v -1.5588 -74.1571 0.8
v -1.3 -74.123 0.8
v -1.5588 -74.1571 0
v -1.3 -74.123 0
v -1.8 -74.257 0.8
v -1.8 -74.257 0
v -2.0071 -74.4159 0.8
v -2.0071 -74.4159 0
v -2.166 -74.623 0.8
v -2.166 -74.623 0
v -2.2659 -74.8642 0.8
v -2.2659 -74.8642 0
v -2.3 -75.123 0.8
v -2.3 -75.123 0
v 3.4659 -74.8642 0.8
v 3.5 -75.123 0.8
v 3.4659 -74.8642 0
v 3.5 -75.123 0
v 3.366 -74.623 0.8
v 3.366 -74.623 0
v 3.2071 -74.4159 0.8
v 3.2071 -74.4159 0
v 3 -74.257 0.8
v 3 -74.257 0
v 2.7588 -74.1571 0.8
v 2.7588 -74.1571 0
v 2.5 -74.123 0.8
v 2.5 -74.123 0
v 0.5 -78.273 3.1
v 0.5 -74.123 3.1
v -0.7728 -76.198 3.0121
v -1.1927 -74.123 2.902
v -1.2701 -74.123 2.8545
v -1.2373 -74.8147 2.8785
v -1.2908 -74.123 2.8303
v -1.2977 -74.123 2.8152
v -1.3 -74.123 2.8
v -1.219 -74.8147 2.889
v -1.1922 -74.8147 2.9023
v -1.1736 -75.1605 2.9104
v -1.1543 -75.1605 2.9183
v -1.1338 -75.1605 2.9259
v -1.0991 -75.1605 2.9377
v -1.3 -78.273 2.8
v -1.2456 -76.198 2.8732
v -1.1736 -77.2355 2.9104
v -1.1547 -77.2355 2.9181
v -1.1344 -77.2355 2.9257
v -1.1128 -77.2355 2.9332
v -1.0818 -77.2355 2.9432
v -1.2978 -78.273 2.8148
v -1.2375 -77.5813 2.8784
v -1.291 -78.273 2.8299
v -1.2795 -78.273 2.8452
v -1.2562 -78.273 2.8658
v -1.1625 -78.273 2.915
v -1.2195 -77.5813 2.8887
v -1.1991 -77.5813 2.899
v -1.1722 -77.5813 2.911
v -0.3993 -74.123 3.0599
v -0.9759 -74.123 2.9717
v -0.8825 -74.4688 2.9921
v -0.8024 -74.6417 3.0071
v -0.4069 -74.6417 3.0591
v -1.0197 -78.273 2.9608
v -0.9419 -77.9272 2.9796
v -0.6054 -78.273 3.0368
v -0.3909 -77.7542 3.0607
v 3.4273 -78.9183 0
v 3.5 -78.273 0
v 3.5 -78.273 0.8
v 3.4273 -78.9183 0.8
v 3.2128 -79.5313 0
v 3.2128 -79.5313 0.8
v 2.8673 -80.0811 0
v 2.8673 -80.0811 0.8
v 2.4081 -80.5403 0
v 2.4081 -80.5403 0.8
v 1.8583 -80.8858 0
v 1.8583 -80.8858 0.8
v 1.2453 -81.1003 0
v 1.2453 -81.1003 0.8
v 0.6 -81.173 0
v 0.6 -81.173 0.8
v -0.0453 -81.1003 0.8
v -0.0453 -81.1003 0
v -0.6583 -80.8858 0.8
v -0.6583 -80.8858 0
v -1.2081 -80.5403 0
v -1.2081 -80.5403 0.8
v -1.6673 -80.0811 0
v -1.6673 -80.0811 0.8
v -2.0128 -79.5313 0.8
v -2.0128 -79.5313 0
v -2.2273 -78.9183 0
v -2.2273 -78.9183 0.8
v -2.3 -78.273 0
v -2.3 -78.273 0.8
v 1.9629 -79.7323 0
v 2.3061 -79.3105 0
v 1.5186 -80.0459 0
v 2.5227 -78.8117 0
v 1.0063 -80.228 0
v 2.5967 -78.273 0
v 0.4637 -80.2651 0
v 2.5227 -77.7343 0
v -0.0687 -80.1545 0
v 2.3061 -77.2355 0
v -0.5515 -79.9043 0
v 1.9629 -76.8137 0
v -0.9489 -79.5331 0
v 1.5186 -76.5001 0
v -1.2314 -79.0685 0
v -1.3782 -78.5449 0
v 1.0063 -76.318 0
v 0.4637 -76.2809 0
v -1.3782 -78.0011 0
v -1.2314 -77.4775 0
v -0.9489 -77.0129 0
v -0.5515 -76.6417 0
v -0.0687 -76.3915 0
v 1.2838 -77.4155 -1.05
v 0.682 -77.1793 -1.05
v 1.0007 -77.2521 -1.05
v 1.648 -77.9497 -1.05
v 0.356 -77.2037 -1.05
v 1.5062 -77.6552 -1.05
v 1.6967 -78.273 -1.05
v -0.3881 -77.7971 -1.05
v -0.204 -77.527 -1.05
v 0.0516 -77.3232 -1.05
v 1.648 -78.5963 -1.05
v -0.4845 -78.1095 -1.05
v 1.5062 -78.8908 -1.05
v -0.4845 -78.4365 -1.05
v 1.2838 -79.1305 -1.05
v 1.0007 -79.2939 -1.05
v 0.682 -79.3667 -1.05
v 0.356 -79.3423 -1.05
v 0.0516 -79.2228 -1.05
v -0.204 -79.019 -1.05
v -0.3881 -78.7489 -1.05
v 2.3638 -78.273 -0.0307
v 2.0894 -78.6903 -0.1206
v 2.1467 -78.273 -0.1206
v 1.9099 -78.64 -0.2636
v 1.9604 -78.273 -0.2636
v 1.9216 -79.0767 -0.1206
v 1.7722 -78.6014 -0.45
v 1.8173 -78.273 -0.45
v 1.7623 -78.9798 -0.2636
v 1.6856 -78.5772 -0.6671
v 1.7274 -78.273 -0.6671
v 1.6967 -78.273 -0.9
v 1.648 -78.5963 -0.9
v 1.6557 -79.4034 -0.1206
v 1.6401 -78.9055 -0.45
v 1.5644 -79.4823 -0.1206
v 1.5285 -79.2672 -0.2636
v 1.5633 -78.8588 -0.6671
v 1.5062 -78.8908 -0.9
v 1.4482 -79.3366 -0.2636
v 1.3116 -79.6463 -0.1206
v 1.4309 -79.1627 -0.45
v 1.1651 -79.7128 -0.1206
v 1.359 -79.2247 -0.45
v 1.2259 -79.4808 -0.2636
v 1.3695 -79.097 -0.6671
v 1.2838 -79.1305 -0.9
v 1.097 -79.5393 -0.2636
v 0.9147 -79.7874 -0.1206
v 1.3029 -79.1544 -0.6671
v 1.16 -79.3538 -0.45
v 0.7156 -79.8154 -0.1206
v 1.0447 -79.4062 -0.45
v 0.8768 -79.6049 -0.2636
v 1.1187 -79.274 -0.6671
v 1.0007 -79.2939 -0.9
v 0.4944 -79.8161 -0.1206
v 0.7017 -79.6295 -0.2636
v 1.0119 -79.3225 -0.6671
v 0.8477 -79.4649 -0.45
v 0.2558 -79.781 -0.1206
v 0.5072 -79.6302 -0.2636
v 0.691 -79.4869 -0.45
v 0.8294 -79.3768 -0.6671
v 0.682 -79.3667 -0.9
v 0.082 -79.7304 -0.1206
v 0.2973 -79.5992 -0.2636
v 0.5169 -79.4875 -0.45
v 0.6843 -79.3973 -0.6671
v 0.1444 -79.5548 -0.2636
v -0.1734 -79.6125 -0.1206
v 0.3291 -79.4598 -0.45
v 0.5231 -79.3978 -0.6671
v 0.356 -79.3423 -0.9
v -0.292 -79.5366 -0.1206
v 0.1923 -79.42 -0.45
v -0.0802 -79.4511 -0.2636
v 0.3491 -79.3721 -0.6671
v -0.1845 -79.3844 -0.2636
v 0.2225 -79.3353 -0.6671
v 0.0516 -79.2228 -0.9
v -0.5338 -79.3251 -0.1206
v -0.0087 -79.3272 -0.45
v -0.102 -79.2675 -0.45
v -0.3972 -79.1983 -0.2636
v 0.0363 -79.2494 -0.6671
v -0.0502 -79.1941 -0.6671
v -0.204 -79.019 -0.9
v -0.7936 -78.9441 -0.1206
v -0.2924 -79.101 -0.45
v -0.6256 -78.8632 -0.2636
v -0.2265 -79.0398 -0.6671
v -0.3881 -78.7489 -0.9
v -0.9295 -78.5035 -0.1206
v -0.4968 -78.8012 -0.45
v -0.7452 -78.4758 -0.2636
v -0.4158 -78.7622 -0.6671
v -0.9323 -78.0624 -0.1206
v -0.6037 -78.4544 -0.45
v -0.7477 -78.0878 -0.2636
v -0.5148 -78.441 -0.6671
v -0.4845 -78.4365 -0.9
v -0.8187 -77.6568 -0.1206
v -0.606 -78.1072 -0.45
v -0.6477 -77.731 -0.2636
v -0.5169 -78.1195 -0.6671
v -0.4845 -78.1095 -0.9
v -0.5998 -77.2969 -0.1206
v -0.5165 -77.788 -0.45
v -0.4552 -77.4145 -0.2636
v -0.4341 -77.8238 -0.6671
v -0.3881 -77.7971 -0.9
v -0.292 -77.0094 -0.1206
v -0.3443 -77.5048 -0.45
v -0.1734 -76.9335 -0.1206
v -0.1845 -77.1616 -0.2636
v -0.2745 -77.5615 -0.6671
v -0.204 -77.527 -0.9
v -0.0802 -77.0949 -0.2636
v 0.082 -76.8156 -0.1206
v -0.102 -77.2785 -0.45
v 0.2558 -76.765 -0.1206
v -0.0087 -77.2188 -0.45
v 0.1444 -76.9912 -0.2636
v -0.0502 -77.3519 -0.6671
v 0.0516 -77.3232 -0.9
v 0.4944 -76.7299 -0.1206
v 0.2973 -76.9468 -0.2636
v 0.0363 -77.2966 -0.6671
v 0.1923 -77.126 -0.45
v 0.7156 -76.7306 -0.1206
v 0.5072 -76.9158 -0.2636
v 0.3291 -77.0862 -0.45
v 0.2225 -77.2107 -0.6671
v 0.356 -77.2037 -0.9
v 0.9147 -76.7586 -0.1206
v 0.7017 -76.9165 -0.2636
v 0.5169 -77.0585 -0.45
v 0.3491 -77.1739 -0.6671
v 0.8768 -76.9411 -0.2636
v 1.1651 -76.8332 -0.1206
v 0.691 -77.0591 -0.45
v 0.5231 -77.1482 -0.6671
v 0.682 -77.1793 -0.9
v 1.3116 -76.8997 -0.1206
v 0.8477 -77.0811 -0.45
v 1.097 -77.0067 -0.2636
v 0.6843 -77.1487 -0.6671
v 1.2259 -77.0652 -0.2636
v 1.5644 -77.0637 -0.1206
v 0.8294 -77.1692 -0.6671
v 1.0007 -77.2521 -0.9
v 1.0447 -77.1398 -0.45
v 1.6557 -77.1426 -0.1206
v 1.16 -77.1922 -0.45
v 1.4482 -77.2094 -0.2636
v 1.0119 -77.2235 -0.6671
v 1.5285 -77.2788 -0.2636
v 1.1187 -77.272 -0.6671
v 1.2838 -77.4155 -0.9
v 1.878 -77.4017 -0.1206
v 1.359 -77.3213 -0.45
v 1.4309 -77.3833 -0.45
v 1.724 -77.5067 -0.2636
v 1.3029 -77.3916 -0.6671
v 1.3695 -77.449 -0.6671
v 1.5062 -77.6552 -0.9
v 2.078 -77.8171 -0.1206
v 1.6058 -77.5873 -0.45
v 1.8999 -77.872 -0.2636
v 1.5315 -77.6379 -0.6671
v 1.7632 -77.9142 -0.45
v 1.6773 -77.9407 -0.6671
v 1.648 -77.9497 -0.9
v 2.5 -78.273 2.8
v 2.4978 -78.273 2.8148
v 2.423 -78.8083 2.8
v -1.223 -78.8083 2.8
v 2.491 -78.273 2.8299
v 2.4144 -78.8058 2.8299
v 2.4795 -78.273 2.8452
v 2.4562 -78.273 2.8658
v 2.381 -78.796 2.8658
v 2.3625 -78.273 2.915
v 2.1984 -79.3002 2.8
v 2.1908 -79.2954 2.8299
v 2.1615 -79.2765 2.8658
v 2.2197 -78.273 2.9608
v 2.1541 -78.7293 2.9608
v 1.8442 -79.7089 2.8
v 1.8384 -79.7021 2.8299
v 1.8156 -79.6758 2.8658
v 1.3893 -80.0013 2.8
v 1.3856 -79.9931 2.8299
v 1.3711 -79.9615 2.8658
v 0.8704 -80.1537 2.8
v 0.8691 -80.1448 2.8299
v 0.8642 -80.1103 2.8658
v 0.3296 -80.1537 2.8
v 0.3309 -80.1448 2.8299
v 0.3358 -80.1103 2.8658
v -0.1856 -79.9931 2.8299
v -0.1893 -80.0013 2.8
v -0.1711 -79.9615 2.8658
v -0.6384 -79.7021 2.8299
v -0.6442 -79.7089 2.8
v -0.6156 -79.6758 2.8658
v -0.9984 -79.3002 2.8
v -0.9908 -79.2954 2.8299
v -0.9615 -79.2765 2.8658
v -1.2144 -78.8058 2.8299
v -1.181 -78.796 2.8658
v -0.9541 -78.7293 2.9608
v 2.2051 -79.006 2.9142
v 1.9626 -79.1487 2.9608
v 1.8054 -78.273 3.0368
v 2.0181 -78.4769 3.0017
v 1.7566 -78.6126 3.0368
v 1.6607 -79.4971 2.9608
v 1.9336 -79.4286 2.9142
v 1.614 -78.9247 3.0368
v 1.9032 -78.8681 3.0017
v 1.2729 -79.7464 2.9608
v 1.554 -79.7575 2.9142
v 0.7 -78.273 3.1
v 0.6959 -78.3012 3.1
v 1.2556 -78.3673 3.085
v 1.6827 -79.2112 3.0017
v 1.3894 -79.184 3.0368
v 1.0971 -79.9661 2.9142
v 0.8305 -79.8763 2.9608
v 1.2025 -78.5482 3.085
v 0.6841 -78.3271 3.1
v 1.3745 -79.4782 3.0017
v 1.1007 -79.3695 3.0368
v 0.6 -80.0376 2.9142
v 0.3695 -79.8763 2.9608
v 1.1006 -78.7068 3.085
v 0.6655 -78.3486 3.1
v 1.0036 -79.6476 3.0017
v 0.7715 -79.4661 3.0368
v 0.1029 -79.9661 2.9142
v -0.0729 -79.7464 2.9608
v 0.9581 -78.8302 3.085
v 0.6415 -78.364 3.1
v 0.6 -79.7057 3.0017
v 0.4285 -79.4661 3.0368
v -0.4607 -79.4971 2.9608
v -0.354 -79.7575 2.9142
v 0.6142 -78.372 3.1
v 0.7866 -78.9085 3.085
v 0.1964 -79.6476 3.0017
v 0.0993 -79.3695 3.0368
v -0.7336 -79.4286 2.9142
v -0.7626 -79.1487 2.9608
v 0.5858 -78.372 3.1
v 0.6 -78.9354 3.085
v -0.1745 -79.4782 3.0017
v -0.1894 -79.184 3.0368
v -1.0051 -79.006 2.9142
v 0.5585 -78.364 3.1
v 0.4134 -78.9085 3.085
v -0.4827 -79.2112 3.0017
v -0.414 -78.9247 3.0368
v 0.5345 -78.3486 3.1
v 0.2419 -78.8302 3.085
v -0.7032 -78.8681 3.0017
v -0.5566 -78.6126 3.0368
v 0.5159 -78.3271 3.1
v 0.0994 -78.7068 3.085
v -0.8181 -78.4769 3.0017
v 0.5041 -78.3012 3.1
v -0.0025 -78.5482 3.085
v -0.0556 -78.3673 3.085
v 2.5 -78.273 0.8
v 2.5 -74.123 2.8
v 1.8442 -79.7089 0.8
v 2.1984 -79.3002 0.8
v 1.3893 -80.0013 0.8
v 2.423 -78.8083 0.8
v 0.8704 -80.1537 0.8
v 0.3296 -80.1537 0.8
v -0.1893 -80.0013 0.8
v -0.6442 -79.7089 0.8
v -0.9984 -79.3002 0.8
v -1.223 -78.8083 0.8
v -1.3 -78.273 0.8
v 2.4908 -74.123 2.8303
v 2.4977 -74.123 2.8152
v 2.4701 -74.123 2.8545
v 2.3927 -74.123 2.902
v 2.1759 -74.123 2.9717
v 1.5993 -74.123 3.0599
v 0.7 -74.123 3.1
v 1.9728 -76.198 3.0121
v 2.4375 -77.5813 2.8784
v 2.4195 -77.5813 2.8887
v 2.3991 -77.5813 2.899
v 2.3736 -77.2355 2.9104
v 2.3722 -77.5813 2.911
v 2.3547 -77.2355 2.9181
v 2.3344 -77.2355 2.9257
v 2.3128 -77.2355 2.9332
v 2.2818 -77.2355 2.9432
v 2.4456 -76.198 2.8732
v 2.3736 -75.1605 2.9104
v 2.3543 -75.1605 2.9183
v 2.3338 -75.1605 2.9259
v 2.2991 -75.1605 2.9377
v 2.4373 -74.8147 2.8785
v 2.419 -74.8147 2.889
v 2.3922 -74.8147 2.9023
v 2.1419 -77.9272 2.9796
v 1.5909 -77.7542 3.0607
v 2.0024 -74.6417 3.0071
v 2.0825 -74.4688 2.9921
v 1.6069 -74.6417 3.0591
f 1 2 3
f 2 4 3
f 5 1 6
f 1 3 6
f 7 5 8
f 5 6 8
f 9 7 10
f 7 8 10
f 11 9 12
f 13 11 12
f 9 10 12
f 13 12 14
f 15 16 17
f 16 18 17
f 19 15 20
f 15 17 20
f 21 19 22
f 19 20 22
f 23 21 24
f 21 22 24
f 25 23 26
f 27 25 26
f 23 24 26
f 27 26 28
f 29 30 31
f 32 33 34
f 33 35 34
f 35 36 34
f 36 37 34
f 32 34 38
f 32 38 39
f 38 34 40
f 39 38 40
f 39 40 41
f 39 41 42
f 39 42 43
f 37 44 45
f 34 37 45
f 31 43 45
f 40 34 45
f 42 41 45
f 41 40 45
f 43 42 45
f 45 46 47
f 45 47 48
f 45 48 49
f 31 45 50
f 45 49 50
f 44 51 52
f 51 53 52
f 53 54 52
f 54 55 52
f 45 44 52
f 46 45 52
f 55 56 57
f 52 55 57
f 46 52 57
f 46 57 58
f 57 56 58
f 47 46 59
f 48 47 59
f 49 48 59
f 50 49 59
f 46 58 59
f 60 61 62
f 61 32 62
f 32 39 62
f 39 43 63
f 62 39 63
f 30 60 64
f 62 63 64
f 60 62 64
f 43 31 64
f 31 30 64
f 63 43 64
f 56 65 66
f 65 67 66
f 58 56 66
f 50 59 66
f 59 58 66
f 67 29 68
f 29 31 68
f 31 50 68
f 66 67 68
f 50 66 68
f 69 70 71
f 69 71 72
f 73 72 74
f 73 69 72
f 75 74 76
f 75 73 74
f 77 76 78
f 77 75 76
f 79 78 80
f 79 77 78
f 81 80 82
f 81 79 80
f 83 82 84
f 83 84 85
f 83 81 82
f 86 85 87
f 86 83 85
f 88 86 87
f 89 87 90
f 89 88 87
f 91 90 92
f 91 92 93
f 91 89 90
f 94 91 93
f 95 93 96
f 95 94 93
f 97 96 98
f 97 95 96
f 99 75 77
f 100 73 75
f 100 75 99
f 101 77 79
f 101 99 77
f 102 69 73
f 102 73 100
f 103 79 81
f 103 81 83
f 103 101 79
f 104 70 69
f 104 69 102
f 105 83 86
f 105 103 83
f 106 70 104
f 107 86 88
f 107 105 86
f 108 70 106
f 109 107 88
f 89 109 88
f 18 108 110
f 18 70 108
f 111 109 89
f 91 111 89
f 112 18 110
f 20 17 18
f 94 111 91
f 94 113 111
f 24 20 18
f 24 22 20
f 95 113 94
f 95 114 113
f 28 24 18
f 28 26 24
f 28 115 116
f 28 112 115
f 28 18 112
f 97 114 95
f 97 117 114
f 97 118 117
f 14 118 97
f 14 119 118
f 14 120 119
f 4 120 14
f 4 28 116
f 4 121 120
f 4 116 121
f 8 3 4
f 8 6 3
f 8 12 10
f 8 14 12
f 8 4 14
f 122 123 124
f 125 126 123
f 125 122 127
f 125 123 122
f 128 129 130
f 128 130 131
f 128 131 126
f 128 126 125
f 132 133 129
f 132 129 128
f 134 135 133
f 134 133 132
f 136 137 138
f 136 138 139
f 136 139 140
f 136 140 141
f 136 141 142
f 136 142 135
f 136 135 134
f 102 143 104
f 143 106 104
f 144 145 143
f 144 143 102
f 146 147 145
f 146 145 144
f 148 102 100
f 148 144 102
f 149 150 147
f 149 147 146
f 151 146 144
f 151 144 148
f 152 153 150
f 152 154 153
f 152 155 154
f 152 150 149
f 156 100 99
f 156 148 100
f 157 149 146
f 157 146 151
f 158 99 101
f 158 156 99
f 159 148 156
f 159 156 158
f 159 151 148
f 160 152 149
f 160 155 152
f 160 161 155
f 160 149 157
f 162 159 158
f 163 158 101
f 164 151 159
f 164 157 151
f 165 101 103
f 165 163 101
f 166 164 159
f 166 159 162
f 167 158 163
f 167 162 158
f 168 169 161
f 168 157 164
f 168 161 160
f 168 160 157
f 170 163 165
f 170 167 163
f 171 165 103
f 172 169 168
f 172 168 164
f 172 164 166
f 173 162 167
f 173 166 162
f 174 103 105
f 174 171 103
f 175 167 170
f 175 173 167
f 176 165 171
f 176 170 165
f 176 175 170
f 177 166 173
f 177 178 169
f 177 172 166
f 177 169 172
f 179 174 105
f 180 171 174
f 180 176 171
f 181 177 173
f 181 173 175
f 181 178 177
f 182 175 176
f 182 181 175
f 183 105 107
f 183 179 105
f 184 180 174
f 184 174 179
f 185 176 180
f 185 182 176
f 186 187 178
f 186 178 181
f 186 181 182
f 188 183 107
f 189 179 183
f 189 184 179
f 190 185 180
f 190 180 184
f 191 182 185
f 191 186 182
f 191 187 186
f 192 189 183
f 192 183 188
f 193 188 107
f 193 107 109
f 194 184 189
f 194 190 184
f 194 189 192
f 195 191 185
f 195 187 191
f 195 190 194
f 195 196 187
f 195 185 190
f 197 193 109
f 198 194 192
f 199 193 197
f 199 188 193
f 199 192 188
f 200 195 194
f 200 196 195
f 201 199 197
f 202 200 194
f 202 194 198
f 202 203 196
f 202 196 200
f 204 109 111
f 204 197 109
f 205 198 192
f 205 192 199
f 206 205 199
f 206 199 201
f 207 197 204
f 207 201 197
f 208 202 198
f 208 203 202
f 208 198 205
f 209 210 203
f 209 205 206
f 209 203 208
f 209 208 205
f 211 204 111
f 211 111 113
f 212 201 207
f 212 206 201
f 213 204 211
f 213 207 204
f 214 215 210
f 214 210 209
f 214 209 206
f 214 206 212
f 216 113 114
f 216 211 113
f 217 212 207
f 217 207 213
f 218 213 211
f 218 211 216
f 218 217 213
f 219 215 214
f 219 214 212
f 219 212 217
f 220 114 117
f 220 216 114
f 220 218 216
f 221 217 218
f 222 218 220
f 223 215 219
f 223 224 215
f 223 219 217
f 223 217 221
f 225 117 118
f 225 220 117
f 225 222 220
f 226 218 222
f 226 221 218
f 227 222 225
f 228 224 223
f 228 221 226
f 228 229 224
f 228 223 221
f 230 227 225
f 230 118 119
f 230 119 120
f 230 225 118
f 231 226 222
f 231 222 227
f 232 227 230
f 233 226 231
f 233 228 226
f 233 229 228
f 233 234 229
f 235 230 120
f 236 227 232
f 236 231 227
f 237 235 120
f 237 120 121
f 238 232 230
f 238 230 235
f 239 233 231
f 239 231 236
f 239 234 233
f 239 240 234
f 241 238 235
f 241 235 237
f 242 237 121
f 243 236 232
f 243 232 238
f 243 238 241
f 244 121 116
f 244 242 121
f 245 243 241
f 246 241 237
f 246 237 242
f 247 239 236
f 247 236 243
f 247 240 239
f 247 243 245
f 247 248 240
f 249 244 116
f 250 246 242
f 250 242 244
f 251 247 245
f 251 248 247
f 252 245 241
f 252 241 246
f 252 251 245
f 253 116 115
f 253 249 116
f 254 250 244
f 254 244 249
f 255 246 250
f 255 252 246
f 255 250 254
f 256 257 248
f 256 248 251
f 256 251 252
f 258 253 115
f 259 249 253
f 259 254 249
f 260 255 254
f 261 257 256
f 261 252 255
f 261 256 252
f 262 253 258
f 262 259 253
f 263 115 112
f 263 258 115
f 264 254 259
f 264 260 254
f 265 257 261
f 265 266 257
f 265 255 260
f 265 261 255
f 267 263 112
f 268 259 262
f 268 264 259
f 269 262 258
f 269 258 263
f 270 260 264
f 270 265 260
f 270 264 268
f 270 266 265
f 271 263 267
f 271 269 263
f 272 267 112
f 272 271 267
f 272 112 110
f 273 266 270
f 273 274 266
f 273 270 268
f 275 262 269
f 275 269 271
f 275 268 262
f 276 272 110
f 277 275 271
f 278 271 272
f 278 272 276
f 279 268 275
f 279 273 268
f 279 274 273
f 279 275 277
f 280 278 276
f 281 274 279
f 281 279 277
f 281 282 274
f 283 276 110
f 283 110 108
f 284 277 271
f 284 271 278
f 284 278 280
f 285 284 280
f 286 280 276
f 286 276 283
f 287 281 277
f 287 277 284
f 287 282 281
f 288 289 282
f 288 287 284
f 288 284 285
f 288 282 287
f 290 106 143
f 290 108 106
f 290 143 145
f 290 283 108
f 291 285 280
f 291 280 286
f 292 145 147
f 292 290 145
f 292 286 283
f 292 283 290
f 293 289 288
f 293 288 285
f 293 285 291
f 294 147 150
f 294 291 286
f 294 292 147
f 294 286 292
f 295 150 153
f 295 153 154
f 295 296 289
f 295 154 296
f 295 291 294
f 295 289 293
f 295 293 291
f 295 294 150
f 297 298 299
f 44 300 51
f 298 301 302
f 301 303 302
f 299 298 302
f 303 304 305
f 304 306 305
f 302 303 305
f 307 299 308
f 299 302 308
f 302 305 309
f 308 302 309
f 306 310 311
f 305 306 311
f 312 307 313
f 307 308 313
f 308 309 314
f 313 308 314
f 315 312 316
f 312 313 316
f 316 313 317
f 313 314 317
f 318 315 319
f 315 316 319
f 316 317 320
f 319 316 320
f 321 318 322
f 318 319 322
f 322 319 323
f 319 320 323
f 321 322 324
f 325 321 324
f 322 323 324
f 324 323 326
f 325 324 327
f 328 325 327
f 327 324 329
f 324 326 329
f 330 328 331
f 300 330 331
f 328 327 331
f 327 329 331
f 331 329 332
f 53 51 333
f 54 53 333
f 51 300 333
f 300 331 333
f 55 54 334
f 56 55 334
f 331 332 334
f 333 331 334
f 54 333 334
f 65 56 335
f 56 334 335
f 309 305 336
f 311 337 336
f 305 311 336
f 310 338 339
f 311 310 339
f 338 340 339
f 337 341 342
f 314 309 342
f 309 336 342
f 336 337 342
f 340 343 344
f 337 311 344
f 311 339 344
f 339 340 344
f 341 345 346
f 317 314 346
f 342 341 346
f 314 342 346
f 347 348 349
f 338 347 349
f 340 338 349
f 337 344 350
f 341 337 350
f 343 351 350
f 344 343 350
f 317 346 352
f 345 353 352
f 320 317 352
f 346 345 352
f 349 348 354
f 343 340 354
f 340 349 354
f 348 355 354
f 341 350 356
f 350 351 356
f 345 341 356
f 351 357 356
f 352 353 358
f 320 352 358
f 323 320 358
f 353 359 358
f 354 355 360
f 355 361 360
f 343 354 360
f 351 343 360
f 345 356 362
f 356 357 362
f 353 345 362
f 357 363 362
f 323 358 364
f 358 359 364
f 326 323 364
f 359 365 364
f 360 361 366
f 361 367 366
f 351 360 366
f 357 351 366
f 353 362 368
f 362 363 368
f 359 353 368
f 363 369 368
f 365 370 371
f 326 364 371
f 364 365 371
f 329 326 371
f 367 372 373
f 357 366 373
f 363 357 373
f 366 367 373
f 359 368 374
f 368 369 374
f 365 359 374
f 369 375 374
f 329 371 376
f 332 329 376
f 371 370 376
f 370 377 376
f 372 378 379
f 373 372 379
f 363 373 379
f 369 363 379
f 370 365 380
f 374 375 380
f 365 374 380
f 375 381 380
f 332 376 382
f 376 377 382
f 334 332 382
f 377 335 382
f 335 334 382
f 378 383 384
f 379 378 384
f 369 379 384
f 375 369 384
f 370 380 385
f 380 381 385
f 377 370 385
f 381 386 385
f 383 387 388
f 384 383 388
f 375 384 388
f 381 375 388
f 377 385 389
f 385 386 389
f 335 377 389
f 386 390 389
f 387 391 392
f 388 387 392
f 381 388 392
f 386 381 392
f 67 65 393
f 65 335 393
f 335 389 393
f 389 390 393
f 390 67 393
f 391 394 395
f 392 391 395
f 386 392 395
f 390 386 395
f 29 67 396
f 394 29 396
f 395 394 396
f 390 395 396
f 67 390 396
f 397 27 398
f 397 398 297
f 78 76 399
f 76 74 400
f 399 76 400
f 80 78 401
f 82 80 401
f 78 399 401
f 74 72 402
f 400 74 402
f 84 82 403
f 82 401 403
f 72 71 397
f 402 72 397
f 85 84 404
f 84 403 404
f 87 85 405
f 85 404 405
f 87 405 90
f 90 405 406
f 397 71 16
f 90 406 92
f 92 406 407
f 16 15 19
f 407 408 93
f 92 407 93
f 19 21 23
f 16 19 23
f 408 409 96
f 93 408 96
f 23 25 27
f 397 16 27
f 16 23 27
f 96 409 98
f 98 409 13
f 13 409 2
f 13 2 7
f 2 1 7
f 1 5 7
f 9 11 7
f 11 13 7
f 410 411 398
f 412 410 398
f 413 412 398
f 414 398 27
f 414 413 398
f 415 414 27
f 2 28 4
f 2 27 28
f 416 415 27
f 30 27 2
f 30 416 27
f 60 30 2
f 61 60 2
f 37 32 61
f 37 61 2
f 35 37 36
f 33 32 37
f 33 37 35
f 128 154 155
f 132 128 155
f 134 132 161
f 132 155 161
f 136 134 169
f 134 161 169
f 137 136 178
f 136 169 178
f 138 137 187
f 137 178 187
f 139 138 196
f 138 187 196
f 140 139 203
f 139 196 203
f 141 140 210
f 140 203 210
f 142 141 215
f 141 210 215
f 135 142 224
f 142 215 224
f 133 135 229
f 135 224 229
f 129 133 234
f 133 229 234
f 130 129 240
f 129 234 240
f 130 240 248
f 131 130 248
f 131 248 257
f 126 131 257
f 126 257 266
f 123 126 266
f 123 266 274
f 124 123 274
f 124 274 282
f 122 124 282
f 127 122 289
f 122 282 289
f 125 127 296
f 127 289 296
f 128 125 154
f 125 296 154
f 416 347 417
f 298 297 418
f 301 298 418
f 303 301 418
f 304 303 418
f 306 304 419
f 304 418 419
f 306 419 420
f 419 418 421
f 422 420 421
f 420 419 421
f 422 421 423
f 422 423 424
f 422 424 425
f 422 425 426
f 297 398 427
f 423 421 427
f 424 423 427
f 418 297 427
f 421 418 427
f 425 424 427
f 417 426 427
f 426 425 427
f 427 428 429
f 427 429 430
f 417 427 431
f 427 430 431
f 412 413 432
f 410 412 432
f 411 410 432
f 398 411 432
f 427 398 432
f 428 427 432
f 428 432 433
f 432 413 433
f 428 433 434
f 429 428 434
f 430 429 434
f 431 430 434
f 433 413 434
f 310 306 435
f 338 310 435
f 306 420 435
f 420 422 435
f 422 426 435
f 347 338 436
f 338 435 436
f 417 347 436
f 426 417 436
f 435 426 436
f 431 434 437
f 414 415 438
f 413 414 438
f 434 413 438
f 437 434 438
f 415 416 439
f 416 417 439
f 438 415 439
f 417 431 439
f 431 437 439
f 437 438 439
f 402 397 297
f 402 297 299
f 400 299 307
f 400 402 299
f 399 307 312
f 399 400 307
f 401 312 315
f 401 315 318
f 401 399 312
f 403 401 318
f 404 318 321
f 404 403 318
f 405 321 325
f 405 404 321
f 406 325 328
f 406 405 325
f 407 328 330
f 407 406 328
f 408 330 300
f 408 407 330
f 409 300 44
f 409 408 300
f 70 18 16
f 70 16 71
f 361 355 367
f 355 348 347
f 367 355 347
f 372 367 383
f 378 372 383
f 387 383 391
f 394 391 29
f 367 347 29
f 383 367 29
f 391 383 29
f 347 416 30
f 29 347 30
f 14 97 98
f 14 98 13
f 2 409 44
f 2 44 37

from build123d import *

# Parameters (mm, degrees)
EXTRUDE_1_DEPTH          = 3.1
EXTRUDE_2_DEPTH          = 0.8
FILLET_1_SIZE            = 0.3
FILLET_1_SIZE_2          = 1.8
SKETCH_3_R               = 1
SKETCH_3_R_2             = 1.096749421
EXTRUDE_3_DEPTH          = 1.05
FILLET_5_R               = 0.9
CUT_EXTRUDE_2_DEPTH      = 82.307539193
CUT_EXTRUDE_2_DEPTH_BACK = 82.307539193
SKETCH_7_W               = 5.8
SKETCH_7_H               = 24.900002621
FILLET_6_R               = 1


with BuildPart() as part:
    # 草图1 → 凸台-拉伸1 (new body)
    with BuildSketch(Plane.XY):
        with BuildLine():
            Line((-1.3, -78.273), (-1.3, -61.672998253))
            ThreePointArc((-1.3, -61.672998253), (0.6, -59.772998253), (2.5, -61.672998253))
            Line((2.5, -61.672998253), (2.5, -78.273))
            ThreePointArc((2.5, -78.273), (0.6, -80.173), (-1.3, -78.273))
        make_face()
    extrude(amount=EXTRUDE_1_DEPTH)

    # 草图2 → 凸台-拉伸2 (add)
    with BuildSketch(Plane(origin=(0, 0, 0), x_dir=(-1, 0, 0), z_dir=(0, 0, -1))):
        with BuildLine():
            Line((2.3, -78.273), (2.3, -61.672998253))
            ThreePointArc((2.3, -61.672998253), (-0.6, -58.772998253), (-3.5, -61.672998253))
            Line((-3.5, -61.672998253), (-3.5, -78.273))
            ThreePointArc((-3.5, -78.273), (-0.6, -81.173), (2.3, -78.273))
        make_face()
    extrude(amount=-EXTRUDE_2_DEPTH)

    # 圆角1
    # an asymmetric fillet: 1.8, 0.3 mm, written as the material it takes off along each edge
    with BuildSketch(Plane(origin=(2.5, -61.672998253, 3.1), x_dir=(0, 0, -1), z_dir=(0, -1, 0)), Plane(origin=(-1.3, -78.273, 3.1), x_dir=(0, 0, -1), z_dir=(0, 1, 0))) as fillet_1_piece_1:
        with BuildLine():
            Bezier((FILLET_1_SIZE, 0), (0, 0), (0, -FILLET_1_SIZE_2), weights=[1, 0.707106781, 1])
            Line((0, -FILLET_1_SIZE_2), (0, 0))
            Line((0, 0), (FILLET_1_SIZE, 0))
        make_face()
    extrude(amount=16.600001747, mode=Mode.SUBTRACT)
    with BuildSketch(Plane(origin=(0.6, -61.672998253, 3.1), x_dir=(-1, 0, 0), z_dir=(0, -1, 0))) as fillet_1_piece_2:
        with BuildLine():
            Bezier((1.9, FILLET_1_SIZE), (1.9, 0), (1.9 - FILLET_1_SIZE_2, 0), weights=[1, 0.707106781, 1])
            Line((1.9 - FILLET_1_SIZE_2, 0), (1.9, 0))
            Line((1.9, 0), (1.9, FILLET_1_SIZE))
        make_face()
    revolve(axis=Axis((0.6, -61.672998253, 3.1), (0, 0, -1)), revolution_arc=180, mode=Mode.SUBTRACT)
    with BuildSketch(Plane(origin=(0.6, -78.273, 3.1), x_dir=(1, 0, 0), z_dir=(0, 1, 0))) as fillet_1_piece_3:
        with BuildLine():
            Bezier((1.9, FILLET_1_SIZE), (1.9, 0), (1.9 - FILLET_1_SIZE_2, 0), weights=[1, 0.707106781, 1])
            Line((1.9 - FILLET_1_SIZE_2, 0), (1.9, 0))
            Line((1.9, 0), (1.9, FILLET_1_SIZE))
        make_face()
    revolve(axis=Axis((0.6, -78.273, 3.1), (0, 0, -1)), revolution_arc=180, mode=Mode.SUBTRACT)

    # 草图3 → 凸台-拉伸3 (add)
    with BuildSketch(Plane(origin=(0, 0, 0), x_dir=(-1, 0, 0), z_dir=(0, 0, -1))):
        with Locations(Location((-0.6, -61.672998253, 0), (0, 0, 180))):
            Circle(SKETCH_3_R)
        with Locations(Location((-0.6, -69.972999126, 0), (0, 0, 180))):
            Circle(SKETCH_3_R_2)
        with Locations(Location((-0.6, -78.273, 0), (0, 0, 180))):
            Circle(SKETCH_3_R_2)
    extrude(amount=EXTRUDE_3_DEPTH)

    # 圆角5
    fillet_5_edges = [part.edges().sort_by_distance(p)[0] for p in [
        (-0.4, -61.672998253, 0),
        (-0.496749421, -69.972999126, 0),
        (-0.496749421, -78.273, 0),
    ]]
    fillet(fillet_5_edges, radius=FILLET_5_R)

    # 草图7 → 切除-拉伸2 (cut, two sides: drawn at the far end of the back side and taken through both)
    with BuildSketch(Plane(origin=(0, 0, 0), x_dir=(-1, 0, 0), z_dir=(0, 0, -1)).offset(-CUT_EXTRUDE_2_DEPTH_BACK)):
        with Locations((-0.6, -61.672998253)):
            Rectangle(SKETCH_7_W, SKETCH_7_H)
    extrude(amount=CUT_EXTRUDE_2_DEPTH + CUT_EXTRUDE_2_DEPTH_BACK, mode=Mode.SUBTRACT)

    # 圆角6
    fillet_6_edges = [part.edges().sort_by_distance(p)[0] for p in [
        (-2.3, -74.122999563, 0.4),
        (3.5, -74.122999563, 0.4),
    ]]
    fillet(fillet_6_edges, radius=FILLET_6_R)


solid = part.part
